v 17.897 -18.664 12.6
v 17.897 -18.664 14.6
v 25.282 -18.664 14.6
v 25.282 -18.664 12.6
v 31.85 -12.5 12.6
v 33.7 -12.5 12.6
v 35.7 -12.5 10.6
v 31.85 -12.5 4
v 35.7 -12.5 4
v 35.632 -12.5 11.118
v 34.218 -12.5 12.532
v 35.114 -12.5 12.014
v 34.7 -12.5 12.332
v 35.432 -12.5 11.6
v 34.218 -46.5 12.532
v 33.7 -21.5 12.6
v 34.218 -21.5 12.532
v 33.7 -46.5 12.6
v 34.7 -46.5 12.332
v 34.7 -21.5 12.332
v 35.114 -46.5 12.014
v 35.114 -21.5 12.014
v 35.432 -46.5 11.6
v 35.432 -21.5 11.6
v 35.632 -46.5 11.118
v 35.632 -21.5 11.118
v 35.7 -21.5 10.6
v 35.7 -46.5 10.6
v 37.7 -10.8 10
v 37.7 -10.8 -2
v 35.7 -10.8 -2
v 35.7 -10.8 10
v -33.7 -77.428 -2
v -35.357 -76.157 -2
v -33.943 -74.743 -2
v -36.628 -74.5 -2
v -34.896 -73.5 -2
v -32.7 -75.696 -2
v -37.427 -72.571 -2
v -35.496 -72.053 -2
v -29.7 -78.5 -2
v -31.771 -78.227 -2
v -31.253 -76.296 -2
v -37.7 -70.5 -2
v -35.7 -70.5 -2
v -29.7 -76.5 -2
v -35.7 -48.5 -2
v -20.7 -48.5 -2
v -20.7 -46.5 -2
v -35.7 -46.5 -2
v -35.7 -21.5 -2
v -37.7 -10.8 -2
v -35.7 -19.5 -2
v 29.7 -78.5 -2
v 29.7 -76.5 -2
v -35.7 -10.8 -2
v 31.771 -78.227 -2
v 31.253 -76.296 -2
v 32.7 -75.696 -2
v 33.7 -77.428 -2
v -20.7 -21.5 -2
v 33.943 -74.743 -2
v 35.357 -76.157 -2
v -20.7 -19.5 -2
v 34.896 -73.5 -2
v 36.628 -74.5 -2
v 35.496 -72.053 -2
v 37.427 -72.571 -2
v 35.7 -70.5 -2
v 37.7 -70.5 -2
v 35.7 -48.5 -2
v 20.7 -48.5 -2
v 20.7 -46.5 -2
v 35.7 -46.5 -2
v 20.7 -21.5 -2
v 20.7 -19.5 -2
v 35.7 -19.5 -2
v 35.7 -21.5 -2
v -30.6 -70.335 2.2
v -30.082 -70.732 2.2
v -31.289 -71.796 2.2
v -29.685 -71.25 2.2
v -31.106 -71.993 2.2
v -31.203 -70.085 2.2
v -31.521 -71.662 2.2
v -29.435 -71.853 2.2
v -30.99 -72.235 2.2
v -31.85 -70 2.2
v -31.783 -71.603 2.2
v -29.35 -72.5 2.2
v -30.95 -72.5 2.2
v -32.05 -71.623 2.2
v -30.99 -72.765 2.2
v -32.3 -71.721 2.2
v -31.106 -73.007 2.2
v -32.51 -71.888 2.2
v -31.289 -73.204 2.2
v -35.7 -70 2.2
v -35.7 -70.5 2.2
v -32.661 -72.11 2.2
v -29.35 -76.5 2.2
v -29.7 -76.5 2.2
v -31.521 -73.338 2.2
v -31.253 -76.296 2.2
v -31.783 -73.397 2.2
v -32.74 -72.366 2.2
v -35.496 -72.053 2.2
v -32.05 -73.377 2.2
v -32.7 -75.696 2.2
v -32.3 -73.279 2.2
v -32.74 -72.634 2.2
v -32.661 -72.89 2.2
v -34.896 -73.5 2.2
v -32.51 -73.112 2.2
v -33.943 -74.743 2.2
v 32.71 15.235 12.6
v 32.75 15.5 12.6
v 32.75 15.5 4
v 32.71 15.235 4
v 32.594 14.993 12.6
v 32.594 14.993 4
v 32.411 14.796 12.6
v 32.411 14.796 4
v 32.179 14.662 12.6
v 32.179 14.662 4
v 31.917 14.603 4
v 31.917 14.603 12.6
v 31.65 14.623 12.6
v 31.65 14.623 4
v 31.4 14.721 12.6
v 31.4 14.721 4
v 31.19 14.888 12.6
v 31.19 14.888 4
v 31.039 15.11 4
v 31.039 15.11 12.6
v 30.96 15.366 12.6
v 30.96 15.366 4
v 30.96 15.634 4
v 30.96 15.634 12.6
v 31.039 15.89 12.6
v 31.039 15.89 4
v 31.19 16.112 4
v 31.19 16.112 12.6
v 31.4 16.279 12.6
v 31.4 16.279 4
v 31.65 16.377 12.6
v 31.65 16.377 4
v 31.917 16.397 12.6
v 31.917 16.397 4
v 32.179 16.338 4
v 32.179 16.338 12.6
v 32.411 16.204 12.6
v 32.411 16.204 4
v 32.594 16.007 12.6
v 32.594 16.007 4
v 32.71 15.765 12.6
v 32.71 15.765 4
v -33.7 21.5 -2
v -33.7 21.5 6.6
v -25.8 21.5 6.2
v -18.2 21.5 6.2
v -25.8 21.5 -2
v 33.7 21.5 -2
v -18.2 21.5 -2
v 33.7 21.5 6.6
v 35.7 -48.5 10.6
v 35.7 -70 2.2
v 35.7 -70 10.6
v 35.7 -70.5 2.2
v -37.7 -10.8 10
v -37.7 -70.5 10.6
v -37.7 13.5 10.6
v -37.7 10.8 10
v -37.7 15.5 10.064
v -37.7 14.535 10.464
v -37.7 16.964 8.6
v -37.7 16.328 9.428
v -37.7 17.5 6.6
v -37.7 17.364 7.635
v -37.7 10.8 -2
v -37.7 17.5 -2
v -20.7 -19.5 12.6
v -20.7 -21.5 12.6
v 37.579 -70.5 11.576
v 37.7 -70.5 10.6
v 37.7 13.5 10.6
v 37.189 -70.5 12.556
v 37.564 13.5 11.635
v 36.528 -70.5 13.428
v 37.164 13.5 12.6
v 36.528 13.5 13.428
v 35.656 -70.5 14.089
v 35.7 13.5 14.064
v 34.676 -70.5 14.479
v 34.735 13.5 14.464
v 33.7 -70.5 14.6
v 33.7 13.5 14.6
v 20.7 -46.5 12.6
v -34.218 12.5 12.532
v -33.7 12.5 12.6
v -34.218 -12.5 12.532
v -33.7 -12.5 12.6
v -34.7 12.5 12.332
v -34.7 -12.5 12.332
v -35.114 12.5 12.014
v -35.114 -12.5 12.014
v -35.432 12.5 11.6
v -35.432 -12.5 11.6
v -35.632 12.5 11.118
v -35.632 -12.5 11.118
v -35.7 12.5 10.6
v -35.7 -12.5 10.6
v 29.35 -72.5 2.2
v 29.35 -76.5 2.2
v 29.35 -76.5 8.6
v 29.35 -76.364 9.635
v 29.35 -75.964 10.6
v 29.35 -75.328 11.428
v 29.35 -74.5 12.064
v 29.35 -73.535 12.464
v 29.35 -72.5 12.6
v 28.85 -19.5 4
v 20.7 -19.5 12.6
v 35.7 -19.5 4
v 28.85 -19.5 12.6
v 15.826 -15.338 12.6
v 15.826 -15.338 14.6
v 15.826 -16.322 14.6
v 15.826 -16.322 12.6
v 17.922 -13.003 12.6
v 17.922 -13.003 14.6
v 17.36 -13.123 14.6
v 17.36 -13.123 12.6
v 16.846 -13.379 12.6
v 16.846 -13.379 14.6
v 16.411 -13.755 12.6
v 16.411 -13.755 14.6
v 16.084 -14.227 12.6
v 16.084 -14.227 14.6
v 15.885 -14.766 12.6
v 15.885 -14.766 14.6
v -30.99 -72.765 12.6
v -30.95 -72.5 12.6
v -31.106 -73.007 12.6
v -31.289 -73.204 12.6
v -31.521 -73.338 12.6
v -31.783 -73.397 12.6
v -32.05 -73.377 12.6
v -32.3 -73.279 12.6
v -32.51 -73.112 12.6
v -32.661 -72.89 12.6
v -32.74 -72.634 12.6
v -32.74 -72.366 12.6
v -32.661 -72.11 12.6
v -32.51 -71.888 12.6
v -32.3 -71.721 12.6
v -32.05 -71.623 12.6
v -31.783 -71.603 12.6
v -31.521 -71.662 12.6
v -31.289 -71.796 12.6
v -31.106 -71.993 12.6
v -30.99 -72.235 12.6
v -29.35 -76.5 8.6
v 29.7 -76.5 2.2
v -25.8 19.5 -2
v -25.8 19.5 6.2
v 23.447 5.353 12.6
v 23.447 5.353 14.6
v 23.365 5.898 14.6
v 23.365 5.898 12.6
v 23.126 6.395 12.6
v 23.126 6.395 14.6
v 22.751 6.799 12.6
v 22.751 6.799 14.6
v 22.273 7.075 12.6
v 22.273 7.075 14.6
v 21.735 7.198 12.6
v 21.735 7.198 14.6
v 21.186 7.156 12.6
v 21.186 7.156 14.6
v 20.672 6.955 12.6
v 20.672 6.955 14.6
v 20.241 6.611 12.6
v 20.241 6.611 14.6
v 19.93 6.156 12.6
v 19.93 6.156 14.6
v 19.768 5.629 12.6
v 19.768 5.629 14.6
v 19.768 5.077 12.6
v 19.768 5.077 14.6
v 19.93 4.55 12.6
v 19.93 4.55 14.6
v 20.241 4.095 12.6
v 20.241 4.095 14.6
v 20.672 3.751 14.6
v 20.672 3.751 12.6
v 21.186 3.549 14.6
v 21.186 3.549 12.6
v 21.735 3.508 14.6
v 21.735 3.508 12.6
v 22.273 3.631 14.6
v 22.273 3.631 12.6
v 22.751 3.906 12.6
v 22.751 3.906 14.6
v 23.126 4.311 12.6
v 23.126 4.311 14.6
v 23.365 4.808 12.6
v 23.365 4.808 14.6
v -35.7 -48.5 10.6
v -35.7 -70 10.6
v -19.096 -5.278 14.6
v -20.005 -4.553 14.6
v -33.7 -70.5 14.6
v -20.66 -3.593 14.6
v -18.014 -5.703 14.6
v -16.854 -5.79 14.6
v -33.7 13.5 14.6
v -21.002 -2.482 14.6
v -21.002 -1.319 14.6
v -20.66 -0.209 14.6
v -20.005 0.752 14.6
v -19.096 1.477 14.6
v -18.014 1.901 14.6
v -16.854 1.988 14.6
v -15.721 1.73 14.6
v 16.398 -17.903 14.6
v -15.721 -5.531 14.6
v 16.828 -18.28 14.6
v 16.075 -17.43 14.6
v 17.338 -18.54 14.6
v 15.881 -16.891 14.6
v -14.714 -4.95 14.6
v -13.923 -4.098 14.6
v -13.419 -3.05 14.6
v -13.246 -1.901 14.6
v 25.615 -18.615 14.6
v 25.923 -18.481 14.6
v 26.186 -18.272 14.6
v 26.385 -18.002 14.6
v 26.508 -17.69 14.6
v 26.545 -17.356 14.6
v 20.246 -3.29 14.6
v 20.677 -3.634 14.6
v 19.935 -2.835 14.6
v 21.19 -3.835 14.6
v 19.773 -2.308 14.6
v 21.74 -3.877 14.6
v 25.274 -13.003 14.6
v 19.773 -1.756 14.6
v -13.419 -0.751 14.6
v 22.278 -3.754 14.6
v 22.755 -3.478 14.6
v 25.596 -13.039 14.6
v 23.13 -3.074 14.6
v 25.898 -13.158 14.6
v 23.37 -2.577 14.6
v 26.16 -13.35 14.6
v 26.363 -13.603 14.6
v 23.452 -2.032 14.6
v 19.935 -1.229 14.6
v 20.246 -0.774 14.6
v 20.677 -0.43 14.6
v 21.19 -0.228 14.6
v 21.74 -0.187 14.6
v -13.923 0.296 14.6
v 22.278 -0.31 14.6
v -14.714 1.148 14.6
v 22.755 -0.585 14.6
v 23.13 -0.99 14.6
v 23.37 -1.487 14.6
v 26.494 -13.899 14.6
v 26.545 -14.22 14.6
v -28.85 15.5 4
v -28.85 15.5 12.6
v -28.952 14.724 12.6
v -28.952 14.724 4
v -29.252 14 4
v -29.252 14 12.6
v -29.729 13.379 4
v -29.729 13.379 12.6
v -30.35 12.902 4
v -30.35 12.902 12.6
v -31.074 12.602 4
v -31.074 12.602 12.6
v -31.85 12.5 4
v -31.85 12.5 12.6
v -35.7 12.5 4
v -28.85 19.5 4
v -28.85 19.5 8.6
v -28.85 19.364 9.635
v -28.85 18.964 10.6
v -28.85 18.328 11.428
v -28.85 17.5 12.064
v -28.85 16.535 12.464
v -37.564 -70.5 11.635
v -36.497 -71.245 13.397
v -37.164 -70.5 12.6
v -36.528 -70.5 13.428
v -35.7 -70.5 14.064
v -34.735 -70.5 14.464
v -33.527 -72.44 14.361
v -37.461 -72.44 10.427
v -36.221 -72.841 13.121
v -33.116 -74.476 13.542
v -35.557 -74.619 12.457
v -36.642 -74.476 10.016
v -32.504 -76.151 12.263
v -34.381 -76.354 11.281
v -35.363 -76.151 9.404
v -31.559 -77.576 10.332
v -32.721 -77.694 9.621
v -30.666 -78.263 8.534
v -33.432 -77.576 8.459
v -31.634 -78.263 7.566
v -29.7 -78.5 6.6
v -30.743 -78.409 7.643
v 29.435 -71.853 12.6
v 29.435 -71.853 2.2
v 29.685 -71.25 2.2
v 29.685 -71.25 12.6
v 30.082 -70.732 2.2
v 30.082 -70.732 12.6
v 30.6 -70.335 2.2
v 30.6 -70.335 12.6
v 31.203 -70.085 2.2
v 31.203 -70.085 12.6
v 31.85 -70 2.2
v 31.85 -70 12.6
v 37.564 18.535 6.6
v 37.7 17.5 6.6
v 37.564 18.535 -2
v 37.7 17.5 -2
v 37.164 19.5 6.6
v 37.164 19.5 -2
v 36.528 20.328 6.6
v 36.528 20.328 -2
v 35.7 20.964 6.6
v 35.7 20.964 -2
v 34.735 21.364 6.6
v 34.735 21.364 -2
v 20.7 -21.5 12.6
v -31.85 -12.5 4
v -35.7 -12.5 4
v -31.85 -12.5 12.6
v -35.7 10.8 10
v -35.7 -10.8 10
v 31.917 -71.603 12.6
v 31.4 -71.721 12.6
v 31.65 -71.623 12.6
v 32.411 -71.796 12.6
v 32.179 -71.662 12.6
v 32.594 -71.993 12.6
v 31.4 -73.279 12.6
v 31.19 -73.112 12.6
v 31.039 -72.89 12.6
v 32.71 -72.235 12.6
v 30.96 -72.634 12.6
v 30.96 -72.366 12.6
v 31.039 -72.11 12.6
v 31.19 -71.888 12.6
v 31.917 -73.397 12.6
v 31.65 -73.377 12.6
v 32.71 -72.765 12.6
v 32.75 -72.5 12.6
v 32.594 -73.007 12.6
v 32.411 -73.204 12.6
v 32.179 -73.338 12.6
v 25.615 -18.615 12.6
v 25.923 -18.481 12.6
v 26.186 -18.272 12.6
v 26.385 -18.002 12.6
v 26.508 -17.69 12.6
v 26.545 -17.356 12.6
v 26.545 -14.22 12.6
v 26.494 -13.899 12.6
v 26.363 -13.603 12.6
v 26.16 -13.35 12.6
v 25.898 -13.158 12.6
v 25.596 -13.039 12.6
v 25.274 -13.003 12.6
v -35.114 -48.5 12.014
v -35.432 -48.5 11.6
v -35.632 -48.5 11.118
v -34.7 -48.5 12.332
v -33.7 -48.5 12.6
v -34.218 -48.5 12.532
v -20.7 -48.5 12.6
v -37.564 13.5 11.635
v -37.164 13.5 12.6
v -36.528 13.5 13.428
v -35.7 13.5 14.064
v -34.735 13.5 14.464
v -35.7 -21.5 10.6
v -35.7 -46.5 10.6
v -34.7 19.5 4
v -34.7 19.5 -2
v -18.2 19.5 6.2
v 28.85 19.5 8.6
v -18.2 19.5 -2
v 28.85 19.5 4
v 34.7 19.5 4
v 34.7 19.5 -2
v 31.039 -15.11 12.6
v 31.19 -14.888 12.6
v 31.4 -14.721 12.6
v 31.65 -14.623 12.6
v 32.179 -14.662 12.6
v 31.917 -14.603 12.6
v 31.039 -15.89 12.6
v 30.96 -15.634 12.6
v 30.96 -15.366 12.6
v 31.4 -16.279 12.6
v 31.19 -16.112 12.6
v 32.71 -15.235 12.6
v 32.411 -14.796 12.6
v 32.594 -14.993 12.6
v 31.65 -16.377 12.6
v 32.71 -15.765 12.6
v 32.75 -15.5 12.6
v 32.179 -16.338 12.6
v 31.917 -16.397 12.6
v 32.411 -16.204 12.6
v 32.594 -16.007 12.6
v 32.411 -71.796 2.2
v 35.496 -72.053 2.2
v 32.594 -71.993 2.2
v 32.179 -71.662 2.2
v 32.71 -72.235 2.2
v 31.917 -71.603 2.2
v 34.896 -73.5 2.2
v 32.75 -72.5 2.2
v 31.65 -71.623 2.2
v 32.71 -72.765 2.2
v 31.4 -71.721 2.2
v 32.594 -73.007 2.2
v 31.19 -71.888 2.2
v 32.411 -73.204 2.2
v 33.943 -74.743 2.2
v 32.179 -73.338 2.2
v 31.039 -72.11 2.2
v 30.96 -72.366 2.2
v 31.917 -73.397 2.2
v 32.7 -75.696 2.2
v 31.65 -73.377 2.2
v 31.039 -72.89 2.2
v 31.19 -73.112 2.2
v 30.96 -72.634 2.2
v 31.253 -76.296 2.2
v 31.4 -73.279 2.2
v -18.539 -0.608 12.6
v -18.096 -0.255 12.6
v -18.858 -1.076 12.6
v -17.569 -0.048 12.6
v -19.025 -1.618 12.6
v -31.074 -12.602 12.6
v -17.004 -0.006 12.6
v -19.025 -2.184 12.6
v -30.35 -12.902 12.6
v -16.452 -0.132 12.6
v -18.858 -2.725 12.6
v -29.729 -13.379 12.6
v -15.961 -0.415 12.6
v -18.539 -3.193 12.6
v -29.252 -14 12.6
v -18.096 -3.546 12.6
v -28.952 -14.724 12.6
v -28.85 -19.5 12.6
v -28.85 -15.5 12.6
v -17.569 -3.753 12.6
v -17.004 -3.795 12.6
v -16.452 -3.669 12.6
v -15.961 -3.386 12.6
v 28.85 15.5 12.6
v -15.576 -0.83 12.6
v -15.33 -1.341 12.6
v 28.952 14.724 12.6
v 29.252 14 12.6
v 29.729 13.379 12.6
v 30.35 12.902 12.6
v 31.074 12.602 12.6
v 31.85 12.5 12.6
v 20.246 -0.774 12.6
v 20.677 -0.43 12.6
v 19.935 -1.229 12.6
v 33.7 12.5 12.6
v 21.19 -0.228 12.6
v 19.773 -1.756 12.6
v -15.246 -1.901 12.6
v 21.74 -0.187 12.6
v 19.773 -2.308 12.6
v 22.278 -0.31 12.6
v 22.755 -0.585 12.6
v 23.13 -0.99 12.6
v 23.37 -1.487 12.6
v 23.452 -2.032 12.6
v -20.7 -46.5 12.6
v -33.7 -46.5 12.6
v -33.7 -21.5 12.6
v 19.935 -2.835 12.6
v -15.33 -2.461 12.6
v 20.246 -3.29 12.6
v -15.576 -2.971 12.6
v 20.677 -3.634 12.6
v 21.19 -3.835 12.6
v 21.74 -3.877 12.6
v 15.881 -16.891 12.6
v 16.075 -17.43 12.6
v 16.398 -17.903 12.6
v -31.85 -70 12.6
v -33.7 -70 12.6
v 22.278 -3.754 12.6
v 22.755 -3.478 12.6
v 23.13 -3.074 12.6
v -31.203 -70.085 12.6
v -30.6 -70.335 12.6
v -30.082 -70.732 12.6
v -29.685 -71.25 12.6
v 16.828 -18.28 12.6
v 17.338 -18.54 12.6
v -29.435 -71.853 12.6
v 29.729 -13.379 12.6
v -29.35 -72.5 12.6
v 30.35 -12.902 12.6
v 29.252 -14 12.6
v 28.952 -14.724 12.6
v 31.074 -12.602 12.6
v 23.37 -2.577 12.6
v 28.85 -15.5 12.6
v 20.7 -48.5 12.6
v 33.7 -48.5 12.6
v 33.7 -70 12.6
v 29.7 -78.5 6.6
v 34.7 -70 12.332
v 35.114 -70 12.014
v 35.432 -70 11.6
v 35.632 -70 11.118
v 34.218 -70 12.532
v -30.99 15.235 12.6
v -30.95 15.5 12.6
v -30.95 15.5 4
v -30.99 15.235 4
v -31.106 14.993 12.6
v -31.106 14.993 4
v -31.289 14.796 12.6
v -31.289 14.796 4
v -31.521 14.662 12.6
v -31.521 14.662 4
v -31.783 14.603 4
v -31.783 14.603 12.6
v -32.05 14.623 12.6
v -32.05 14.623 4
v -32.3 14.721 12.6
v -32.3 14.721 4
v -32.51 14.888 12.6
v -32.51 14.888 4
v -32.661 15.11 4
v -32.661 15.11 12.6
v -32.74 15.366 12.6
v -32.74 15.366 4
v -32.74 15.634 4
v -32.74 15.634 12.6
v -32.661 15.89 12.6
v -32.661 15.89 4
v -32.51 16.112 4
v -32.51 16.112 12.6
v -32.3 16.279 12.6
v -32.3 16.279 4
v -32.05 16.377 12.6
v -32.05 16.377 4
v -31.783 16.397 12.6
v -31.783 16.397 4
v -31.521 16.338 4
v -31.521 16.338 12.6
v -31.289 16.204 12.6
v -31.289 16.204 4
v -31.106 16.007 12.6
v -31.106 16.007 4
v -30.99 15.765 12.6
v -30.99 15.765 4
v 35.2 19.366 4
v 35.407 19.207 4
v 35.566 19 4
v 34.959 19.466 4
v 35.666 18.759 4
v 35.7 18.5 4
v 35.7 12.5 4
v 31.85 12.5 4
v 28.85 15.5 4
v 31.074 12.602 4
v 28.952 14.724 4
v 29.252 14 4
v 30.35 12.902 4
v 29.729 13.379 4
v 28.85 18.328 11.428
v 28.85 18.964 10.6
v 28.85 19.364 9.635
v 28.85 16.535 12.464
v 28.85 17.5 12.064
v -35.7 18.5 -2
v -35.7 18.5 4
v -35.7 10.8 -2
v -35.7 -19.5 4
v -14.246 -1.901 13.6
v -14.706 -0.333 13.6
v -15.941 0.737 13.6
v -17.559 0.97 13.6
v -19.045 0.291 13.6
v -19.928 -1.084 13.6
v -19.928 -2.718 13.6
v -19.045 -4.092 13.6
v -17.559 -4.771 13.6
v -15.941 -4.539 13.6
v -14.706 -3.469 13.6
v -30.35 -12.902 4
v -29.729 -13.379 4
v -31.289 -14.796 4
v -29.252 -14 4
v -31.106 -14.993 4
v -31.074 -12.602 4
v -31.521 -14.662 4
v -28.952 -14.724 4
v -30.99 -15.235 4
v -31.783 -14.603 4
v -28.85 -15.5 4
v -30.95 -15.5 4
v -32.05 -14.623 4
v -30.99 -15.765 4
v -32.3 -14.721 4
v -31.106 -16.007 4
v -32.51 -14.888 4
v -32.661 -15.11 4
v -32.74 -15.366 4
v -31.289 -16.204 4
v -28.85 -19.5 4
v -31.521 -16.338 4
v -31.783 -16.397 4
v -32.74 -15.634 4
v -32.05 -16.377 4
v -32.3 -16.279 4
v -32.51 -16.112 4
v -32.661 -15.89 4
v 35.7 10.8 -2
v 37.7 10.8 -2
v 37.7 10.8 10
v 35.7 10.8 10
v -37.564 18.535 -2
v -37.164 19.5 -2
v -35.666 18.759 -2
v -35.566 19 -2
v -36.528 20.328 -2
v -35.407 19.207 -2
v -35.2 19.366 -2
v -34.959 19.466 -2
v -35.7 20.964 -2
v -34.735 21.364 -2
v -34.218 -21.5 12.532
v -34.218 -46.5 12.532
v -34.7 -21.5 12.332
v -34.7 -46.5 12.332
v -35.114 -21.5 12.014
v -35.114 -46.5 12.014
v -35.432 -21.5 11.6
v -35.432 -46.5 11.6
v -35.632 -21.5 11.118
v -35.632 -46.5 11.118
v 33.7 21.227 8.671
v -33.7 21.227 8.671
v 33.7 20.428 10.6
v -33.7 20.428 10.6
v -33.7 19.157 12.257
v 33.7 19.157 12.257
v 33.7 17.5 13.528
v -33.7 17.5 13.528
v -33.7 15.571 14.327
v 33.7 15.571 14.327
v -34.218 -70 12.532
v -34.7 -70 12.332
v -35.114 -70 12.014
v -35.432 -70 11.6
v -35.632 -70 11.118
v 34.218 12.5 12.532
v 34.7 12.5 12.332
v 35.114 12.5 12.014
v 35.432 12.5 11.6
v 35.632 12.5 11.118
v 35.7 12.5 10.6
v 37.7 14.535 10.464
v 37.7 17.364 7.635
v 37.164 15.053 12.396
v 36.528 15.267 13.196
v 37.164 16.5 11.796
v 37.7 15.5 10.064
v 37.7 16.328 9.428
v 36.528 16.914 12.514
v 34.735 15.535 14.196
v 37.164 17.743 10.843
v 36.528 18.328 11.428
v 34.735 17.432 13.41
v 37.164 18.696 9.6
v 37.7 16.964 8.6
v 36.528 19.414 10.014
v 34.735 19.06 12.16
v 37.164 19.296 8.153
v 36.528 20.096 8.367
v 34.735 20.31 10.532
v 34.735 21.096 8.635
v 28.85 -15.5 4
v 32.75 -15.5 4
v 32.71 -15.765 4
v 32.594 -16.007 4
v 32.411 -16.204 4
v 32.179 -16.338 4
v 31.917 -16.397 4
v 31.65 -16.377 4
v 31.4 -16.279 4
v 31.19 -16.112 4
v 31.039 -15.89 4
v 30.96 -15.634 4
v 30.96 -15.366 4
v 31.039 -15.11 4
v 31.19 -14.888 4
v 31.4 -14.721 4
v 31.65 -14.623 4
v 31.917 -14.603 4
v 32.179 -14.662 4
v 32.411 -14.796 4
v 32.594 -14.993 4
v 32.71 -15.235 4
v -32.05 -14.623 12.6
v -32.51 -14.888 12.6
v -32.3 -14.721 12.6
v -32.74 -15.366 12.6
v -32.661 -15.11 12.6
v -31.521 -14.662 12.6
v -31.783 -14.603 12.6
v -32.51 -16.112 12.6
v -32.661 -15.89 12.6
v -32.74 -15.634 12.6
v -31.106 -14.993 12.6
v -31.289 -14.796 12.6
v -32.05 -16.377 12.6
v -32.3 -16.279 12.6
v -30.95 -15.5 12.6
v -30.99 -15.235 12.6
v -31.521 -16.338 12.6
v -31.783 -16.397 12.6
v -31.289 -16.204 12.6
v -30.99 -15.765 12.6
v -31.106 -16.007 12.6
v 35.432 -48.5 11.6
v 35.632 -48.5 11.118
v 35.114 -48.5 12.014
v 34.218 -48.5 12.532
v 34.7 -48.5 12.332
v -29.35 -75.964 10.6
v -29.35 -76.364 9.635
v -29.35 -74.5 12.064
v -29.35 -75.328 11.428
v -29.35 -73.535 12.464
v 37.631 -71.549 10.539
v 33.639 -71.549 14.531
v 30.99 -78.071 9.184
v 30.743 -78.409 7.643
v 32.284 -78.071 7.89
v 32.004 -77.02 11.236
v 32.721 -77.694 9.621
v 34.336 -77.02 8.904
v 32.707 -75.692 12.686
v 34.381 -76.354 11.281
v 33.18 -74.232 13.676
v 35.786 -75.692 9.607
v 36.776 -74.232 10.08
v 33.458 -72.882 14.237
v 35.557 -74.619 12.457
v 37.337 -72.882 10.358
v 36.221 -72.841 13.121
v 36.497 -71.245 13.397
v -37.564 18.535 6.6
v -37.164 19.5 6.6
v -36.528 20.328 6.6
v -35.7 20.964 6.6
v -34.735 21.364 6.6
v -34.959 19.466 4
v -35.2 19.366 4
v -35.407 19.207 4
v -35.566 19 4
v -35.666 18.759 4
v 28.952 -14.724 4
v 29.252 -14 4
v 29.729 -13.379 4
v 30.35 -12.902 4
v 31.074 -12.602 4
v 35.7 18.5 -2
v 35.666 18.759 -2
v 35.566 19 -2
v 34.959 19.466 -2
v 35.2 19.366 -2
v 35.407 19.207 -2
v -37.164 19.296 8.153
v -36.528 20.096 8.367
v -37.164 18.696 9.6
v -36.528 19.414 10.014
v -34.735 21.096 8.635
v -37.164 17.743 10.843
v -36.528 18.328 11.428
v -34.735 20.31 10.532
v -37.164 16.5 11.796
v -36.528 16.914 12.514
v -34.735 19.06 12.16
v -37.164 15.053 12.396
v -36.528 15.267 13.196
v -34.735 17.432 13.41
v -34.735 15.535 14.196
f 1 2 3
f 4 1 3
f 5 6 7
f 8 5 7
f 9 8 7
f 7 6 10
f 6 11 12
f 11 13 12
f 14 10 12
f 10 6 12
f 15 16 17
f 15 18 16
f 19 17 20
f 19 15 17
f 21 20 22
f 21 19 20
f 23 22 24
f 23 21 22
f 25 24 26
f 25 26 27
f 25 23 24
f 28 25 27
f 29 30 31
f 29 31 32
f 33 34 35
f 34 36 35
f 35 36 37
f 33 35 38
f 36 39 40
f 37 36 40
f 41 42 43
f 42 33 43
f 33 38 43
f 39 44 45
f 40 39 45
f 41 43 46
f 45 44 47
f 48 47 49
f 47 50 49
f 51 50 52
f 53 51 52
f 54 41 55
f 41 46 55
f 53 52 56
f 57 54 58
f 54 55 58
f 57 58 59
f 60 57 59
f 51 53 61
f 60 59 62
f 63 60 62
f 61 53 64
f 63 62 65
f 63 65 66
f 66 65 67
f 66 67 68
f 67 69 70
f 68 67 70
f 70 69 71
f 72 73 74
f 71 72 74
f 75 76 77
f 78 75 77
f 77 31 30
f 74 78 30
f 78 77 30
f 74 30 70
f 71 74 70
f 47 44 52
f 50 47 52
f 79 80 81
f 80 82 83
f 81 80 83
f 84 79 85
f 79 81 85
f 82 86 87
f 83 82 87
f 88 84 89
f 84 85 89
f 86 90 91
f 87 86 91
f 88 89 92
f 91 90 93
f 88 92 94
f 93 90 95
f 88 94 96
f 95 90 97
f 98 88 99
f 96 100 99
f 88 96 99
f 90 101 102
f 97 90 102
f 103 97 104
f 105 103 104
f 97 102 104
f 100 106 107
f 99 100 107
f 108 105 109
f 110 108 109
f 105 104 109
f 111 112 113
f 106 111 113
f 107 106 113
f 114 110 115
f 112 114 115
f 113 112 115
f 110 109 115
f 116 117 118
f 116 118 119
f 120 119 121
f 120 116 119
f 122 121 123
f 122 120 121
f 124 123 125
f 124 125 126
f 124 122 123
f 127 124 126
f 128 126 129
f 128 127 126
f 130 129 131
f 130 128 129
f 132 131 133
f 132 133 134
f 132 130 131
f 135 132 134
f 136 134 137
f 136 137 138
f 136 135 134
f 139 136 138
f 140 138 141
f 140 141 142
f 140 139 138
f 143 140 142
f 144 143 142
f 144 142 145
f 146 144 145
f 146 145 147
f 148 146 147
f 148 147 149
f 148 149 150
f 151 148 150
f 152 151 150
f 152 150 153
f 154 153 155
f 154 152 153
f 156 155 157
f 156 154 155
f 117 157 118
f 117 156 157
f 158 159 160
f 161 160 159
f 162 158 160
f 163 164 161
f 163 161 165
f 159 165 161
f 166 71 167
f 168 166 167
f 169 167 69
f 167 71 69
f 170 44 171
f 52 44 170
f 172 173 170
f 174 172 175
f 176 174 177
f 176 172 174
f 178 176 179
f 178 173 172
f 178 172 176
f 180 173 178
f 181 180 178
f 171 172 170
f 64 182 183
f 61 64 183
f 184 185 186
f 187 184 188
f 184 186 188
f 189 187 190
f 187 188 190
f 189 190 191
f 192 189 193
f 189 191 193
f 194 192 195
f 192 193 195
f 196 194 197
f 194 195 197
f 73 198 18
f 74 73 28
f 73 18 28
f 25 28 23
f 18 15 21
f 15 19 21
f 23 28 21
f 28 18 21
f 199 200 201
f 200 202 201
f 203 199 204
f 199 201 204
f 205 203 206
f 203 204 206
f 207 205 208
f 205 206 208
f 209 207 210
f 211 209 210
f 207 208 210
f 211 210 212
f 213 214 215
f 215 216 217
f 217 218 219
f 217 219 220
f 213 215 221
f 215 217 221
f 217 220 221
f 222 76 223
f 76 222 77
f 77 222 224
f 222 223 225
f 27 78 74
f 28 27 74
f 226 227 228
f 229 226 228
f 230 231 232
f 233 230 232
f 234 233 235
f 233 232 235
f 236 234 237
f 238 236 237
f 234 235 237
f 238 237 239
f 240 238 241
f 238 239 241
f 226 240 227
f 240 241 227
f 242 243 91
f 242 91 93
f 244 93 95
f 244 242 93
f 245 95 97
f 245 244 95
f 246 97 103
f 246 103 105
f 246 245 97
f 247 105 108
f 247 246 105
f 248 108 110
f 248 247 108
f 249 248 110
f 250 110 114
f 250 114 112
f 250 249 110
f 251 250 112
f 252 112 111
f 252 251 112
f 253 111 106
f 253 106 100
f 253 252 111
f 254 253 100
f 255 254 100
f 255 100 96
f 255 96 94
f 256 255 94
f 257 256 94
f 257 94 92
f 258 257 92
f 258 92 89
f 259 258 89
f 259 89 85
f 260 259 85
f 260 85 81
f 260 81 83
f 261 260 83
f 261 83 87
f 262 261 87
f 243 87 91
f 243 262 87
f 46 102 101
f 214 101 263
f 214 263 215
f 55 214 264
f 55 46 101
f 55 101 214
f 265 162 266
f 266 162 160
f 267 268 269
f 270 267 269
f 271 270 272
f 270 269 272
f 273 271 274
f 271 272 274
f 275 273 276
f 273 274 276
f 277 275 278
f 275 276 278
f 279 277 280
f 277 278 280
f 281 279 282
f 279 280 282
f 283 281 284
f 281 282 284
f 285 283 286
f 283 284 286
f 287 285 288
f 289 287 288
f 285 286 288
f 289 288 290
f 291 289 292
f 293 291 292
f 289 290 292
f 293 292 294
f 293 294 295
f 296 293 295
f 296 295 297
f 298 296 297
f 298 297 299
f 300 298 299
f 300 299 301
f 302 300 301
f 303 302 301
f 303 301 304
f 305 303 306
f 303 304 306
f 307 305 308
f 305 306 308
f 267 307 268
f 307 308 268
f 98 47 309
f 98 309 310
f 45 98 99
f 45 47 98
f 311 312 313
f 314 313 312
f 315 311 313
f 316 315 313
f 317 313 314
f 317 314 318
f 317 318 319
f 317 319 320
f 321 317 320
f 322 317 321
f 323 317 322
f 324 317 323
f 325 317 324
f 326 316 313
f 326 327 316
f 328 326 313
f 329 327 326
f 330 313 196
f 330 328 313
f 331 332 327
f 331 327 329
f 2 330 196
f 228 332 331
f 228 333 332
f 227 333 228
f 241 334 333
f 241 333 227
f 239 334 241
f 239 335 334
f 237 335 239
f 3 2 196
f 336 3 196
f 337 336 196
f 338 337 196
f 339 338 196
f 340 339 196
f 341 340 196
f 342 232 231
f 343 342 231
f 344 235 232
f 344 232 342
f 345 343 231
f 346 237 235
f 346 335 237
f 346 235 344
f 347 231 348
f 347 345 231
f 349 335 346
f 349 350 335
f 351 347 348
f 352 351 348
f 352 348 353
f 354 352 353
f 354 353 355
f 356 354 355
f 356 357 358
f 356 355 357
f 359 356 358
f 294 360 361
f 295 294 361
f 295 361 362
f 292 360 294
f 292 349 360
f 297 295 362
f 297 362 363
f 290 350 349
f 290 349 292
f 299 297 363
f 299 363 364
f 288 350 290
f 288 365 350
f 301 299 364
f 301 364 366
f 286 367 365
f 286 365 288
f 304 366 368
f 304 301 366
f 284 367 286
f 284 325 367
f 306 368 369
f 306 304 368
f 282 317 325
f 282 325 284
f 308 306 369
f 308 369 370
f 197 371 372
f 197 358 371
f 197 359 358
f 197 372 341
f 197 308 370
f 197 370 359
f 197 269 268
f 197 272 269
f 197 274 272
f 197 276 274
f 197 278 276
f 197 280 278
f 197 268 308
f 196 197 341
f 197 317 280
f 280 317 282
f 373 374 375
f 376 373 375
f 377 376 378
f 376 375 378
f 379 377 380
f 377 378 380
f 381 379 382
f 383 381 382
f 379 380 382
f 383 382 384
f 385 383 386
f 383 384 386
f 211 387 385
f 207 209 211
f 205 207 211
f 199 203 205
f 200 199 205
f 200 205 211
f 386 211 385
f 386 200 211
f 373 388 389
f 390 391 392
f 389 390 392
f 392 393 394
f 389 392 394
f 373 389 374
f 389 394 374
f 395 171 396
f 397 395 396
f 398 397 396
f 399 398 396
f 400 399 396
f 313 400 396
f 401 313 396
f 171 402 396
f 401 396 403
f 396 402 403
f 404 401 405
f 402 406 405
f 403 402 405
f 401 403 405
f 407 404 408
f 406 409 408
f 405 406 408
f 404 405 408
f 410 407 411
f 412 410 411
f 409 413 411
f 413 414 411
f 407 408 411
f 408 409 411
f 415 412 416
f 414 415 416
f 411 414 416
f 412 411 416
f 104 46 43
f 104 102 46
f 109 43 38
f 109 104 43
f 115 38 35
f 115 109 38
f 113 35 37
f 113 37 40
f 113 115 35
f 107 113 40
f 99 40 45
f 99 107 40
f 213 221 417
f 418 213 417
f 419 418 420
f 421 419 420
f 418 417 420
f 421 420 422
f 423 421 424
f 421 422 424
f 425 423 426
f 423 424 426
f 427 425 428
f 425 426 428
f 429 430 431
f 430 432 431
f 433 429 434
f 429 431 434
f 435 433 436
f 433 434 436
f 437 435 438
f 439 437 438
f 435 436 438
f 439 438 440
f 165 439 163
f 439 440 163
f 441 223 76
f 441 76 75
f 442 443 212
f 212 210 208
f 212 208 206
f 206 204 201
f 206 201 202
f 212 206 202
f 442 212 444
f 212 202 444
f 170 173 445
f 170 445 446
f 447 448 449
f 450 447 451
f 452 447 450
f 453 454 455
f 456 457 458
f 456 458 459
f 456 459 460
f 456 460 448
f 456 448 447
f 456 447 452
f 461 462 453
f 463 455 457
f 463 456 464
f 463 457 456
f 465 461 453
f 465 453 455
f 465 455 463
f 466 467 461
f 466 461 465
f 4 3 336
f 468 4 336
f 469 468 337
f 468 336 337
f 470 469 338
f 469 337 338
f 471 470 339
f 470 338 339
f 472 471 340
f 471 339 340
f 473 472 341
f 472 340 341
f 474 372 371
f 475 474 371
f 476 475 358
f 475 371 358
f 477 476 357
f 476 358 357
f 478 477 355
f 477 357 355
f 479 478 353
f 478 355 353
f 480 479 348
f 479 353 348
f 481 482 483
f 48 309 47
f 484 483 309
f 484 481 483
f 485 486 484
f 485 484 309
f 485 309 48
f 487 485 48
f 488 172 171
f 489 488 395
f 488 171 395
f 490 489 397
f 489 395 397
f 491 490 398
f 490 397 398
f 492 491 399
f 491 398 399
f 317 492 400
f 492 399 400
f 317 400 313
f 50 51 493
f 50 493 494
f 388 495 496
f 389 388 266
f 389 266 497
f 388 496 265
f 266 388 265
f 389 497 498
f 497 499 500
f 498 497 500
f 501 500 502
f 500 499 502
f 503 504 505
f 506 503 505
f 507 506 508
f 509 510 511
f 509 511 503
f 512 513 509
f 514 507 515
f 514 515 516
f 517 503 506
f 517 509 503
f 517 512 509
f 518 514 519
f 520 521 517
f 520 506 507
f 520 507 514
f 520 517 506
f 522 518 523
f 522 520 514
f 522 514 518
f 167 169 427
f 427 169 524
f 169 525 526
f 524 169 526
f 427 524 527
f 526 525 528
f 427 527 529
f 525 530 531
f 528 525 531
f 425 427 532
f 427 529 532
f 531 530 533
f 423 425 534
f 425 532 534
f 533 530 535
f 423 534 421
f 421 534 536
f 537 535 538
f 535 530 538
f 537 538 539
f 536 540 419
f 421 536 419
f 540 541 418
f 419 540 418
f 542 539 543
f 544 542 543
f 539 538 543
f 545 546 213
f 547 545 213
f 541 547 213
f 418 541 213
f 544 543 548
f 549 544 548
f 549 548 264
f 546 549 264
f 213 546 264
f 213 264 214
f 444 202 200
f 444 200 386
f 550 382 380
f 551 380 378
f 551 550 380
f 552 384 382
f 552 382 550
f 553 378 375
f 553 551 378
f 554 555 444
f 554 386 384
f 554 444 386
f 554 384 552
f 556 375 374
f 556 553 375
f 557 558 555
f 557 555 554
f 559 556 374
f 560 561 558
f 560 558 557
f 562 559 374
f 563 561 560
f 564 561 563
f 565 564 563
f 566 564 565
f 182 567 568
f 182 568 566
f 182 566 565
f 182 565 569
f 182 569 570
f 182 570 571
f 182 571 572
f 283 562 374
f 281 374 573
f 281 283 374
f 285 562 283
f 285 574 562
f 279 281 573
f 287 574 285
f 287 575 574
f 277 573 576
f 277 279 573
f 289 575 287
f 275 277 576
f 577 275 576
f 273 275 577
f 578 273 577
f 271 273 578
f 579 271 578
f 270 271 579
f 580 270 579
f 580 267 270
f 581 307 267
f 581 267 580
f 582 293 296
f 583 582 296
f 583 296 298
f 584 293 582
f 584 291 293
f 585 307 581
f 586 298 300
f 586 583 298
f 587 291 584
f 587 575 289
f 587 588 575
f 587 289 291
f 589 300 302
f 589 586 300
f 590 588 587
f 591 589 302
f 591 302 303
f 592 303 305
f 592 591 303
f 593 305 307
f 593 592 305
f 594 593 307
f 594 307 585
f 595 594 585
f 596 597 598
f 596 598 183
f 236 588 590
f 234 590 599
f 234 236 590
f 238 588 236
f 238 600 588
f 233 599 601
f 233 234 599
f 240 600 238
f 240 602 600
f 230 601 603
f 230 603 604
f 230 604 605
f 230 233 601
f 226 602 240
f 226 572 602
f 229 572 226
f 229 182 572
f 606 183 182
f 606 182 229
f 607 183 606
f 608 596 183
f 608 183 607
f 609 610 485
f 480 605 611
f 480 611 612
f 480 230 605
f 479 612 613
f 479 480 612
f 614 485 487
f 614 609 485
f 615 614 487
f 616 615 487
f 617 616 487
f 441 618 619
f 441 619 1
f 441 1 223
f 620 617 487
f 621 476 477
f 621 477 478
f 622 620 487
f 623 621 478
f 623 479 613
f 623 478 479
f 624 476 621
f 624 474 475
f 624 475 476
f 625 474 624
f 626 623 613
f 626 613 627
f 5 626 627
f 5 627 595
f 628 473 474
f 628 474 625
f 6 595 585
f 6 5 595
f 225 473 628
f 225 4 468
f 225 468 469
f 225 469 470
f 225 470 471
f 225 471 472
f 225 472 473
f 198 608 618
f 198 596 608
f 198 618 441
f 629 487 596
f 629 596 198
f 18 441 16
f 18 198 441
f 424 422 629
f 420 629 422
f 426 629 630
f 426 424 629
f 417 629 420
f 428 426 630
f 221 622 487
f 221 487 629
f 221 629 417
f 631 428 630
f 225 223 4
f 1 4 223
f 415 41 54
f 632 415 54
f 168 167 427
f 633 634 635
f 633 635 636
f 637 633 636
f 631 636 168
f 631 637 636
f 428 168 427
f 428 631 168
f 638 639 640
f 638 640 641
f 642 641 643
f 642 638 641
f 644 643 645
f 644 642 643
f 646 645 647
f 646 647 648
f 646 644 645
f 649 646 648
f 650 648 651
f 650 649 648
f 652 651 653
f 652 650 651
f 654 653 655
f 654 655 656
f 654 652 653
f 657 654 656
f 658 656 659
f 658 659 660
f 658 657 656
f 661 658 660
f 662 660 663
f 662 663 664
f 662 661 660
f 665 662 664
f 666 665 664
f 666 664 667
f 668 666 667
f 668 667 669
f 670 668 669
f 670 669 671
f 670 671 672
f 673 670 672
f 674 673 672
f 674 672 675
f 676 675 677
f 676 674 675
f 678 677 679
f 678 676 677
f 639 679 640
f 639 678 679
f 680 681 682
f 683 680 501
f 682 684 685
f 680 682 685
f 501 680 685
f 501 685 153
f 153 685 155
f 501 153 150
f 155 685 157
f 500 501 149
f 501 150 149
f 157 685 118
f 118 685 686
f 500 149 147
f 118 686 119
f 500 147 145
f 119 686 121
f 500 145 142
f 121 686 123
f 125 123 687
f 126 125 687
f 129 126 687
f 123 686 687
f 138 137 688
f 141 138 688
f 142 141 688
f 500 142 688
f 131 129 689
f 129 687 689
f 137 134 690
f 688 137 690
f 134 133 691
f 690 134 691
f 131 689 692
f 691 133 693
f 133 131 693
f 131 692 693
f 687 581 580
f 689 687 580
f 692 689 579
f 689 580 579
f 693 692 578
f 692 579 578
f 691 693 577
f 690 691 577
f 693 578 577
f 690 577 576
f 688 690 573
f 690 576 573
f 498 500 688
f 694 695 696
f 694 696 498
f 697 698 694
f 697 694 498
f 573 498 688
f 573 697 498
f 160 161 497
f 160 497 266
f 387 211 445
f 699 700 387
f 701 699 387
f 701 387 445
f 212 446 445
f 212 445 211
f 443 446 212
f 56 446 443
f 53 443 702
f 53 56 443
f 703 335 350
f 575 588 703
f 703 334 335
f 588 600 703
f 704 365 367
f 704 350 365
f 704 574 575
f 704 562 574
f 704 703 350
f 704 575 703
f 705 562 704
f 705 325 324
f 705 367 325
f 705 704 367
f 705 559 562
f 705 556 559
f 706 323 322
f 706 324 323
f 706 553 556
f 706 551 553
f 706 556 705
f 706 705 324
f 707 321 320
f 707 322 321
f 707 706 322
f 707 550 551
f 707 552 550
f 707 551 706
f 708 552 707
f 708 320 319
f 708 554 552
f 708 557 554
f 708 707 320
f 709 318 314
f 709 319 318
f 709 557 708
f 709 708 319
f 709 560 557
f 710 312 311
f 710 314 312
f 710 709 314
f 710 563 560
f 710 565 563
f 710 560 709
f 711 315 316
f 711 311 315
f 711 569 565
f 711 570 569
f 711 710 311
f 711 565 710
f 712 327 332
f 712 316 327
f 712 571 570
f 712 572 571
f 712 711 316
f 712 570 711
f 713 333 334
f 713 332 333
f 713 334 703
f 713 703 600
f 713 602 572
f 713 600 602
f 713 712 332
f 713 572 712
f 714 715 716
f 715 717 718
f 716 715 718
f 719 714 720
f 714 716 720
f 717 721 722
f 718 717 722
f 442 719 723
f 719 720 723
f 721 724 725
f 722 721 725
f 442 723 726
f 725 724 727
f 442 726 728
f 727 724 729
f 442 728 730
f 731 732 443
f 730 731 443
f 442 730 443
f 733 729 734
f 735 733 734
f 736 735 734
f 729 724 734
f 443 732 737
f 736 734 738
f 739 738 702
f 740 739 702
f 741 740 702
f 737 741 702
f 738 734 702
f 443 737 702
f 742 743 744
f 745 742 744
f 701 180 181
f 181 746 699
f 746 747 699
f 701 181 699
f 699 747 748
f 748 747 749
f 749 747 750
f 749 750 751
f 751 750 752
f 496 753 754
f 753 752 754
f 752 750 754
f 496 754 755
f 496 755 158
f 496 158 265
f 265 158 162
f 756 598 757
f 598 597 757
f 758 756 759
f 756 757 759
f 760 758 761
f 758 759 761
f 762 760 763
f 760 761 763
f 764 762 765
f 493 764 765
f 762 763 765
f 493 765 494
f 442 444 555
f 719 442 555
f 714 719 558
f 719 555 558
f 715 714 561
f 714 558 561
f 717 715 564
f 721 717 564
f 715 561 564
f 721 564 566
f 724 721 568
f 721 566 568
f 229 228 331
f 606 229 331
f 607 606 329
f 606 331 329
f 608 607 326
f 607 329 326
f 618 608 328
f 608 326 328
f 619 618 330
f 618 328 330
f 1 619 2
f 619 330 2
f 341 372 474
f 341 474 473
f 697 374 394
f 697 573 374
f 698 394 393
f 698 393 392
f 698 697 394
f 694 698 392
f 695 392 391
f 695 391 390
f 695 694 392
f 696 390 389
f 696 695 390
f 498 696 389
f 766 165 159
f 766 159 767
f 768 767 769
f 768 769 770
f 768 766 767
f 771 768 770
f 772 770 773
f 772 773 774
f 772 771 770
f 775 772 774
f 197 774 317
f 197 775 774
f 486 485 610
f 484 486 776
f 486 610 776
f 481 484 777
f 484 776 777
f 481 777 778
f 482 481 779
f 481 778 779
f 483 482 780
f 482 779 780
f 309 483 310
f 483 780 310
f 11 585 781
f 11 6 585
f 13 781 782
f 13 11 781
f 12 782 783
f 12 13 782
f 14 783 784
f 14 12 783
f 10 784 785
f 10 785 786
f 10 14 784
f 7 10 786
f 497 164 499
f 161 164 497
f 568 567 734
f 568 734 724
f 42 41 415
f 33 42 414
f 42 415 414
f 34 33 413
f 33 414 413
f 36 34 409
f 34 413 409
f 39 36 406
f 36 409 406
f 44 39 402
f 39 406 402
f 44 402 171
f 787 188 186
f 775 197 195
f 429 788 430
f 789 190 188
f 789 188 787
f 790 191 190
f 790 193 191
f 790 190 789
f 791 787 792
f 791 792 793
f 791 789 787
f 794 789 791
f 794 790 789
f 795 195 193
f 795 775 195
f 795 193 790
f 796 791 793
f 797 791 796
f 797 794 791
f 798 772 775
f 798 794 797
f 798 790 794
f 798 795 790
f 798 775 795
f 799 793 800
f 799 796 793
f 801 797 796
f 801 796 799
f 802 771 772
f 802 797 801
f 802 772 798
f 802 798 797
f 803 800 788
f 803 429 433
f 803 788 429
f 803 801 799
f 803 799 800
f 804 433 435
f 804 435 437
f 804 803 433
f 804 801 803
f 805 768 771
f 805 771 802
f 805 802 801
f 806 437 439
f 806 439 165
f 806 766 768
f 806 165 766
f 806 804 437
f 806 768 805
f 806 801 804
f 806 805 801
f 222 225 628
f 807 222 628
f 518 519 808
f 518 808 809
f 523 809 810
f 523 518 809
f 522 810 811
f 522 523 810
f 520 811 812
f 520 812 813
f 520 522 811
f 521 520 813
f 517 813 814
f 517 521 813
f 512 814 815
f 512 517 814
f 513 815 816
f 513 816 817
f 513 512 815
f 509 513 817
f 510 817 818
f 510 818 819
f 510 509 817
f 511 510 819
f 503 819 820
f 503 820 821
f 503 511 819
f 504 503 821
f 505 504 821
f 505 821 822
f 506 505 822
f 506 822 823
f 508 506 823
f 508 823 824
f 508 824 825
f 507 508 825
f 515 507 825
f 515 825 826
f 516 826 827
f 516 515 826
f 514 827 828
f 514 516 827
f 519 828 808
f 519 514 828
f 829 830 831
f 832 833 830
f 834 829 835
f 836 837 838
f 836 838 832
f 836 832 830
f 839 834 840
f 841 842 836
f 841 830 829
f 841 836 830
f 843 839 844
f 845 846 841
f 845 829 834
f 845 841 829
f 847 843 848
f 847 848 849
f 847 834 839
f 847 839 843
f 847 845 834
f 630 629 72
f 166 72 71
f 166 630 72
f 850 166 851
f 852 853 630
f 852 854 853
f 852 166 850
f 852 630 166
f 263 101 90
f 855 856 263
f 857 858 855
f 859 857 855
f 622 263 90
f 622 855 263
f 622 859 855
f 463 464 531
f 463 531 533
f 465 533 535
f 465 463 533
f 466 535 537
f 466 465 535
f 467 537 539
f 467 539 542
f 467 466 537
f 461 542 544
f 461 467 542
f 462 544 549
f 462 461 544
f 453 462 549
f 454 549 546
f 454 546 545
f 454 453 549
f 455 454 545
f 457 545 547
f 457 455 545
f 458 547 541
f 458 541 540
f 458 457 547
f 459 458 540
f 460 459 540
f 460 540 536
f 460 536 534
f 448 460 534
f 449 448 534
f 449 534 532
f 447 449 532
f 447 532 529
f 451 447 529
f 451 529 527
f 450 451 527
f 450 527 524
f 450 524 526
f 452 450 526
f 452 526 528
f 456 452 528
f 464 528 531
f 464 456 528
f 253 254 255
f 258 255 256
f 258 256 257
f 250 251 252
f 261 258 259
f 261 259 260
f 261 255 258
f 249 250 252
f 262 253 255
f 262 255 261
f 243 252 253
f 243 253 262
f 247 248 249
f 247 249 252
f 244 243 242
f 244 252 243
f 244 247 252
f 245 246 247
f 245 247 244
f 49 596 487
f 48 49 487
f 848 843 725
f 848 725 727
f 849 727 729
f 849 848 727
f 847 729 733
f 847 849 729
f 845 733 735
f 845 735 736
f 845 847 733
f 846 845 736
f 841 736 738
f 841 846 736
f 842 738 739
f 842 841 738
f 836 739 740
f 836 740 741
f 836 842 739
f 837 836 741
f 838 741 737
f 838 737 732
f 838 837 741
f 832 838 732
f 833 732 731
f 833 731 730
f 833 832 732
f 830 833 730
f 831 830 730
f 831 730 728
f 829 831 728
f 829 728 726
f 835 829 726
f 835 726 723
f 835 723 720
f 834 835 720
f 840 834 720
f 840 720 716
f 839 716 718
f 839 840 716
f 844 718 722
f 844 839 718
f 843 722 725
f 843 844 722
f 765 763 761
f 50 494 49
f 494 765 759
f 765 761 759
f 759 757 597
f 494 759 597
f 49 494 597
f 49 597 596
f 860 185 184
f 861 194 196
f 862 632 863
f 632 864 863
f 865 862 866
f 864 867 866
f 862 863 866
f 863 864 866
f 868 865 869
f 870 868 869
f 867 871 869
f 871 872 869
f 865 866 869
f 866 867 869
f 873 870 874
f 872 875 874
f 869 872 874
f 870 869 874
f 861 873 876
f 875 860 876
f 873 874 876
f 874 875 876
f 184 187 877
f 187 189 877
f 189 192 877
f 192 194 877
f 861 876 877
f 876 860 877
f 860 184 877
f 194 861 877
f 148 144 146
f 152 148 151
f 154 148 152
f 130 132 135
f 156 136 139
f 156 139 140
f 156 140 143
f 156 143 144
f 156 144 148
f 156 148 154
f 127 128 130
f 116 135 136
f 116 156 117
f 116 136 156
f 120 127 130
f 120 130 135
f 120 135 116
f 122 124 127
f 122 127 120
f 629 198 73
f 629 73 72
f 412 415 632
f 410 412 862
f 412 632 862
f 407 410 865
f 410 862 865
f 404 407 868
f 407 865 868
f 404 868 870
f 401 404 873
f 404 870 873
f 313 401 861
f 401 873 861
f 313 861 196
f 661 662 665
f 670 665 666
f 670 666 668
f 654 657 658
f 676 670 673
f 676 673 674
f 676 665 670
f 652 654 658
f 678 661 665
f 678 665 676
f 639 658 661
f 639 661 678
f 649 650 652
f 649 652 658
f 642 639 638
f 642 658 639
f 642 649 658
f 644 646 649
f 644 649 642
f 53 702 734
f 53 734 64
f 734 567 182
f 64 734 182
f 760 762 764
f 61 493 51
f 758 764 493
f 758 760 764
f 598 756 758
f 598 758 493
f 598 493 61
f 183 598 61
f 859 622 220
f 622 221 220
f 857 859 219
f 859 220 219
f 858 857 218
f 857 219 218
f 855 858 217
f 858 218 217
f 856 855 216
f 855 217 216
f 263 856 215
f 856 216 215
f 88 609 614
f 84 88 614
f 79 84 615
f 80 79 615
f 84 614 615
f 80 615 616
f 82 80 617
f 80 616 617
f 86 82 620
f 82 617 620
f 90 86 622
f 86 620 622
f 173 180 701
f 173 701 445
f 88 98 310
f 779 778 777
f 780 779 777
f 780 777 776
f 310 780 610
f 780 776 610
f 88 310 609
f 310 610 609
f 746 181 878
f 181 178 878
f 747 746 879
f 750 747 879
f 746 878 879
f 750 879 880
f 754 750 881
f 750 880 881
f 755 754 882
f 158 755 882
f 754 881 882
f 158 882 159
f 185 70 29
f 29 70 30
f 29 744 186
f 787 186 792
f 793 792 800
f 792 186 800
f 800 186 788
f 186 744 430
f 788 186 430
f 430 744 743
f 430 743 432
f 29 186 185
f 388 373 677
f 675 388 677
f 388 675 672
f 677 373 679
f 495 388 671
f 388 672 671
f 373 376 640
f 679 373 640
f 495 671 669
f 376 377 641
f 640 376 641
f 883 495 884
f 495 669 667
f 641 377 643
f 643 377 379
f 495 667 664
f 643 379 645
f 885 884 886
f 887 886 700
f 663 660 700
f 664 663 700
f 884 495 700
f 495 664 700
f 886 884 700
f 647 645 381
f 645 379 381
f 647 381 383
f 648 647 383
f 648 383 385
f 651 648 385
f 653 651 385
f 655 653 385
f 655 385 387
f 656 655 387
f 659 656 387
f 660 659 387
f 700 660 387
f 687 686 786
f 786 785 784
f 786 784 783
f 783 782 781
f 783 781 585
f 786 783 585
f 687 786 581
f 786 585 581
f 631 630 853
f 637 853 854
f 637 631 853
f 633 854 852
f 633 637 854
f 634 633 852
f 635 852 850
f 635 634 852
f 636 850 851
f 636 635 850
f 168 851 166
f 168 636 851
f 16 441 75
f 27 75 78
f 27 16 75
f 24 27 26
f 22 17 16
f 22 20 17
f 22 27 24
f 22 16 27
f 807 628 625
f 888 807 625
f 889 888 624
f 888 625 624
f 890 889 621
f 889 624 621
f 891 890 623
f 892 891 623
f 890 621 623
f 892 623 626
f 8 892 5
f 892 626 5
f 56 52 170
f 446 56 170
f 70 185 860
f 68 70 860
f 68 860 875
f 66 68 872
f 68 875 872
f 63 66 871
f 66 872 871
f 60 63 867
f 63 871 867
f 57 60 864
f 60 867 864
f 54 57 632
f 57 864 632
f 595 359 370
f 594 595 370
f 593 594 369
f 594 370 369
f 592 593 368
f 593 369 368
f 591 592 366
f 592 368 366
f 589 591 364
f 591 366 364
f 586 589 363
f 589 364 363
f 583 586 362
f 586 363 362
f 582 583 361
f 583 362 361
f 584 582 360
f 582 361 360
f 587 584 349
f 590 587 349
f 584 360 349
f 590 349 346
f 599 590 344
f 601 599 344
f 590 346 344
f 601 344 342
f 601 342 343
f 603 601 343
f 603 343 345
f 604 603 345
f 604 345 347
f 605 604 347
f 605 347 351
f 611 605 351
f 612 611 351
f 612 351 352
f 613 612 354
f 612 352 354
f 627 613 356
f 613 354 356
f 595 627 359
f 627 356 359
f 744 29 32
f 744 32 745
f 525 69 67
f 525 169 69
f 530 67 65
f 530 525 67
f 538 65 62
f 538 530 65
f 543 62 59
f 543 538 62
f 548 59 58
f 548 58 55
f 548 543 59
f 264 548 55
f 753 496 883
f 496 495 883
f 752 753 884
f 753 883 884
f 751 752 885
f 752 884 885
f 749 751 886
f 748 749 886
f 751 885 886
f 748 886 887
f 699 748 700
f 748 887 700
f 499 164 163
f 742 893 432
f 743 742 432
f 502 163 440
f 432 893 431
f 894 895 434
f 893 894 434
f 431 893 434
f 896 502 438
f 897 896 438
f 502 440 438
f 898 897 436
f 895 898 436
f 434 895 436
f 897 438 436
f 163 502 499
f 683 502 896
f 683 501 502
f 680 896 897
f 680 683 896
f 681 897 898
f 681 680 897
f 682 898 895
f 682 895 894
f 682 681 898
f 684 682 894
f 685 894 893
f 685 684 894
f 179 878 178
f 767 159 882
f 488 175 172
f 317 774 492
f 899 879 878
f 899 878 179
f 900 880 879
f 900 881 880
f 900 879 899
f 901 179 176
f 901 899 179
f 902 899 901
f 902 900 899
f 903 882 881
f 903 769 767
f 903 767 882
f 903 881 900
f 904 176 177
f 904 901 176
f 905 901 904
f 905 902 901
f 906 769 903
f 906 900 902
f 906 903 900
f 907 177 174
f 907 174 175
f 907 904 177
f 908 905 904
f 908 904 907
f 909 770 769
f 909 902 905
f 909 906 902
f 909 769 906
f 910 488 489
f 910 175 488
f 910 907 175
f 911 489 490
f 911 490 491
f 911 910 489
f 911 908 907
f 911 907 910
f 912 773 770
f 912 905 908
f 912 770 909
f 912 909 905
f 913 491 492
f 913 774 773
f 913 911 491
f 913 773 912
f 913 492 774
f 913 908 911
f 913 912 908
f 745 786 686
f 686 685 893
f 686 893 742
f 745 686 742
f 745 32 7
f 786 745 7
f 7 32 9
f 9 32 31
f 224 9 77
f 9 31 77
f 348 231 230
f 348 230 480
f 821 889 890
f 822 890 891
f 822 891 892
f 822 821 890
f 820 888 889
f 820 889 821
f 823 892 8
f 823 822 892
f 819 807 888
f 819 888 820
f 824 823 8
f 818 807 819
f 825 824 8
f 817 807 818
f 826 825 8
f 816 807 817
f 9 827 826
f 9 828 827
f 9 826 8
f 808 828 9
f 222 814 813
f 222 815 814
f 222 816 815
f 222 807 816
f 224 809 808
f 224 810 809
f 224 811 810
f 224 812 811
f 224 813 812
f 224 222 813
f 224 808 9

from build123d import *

# Parameters (mm, degrees)
SKETCH_W        = 75.4
SKETCH_H        = 100
PAD_DEPTH       = 16.6
SKETCH005_W     = 71.4
SKETCH005_H     = 96
POCKET_DEPTH    = 14.6
SKETCH006_W     = 21.6
SKETCH006_H     = 12
POCKET001_DEPTH = 2
SKETCH007_W     = 21.6
SKETCH007_H     = 12
POCKET002_DEPTH = 2
SKETCH008_W     = 7.6
SKETCH008_H     = 8.2
POCKET003_DEPTH = 2
SKETCH009_R     = 1.85
POCKET004_DEPTH = 2
SKETCH010_R     = 3.9
POCKET005_DEPTH = 2
POCKET005_TAPER = 45
SKETCH011_W     = 15
SKETCH011_H     = 2
PAD005_DEPTH    = 14.6
SKETCH012_R     = 0.9
PAD006_DEPTH    = 8.6
SKETCH013_R     = 0.9
PAD007_DEPTH    = 10.4
FILLET_R        = 2
FILLET001_R     = 4
FILLET002_R     = 1
FILLET003_R     = 6
FILLET004_R     = 8
FILLET005_R     = 4


with BuildPart() as part:
    # Sketch → Pad (new body)
    with BuildSketch(Plane.XY):
        with Locations((0, -28.5)):
            Rectangle(SKETCH_W, SKETCH_H)
    extrude(amount=PAD_DEPTH)

    # Sketch005 (on Face5 of Pad) → Pocket (cut)
    with BuildSketch(Plane(origin=(0, 0, 0), x_dir=(1, 0, 0), z_dir=(0, 0, -1))):
        with Locations((0, 28.5)):
            Rectangle(SKETCH005_W, SKETCH005_H)
    extrude(amount=-POCKET_DEPTH, mode=Mode.SUBTRACT)

    # Sketch006 (on Face3 of Pocket) → Pocket001 (cut)
    with BuildSketch(Plane.YZ.offset(37.7)):
        with Locations((0, 6)):
            Rectangle(SKETCH006_W, SKETCH006_H)
    extrude(amount=-POCKET001_DEPTH, mode=Mode.SUBTRACT)

    # Sketch007 (on Face2 of Pocket) → Pocket002 (cut)
    with BuildSketch(Plane(origin=(-37.7, 0, 0), x_dir=(0, -1, 0), z_dir=(-1, 0, 0))):
        with Locations((0, 6)):
            Rectangle(SKETCH007_W, SKETCH007_H)
    extrude(amount=-POCKET002_DEPTH, mode=Mode.SUBTRACT)

    # Sketch008 (on Face1 of Pocket) → Pocket003 (cut)
    with BuildSketch(Plane(origin=(0, 21.5, 0), x_dir=(-1, 0, 0), z_dir=(0, 1, 0))):
        with Locations((22, 4.1)):
            Rectangle(SKETCH008_W, SKETCH008_H)
    extrude(amount=-POCKET003_DEPTH, mode=Mode.SUBTRACT)

    # Sketch009 (on Face5 of Pocket) → Pocket004 (cut)
    with BuildSketch(Plane.XY.offset(16.6)):
        with Locations((21.601854, -2.031842)):
            Circle(SKETCH009_R)
        with Locations((21.597205, 5.352823)):
            Circle(SKETCH009_R)
        with BuildLine():
            Line((15.825713, -15.337742), (15.825713, -16.321696))
            ThreePointArc((15.825713, -16.321696), (16.397859, -17.902616), (17.897046, -18.663599))
            Line((17.897046, -18.663599), (25.282393, -18.663599))
            ThreePointArc((25.282393, -18.663599), (26.185781, -18.272491), (26.544973, -17.355945))
            Line((26.544973, -14.219638), (26.544973, -17.355945))
            ThreePointArc((26.544973, -14.219638), (26.159832, -13.349897), (25.274241, -13.00275))
            Line((17.921865, -13.00275), (25.274241, -13.00275))
            ThreePointArc((17.921865, -13.00275), (16.411472, -13.755218), (15.825713, -15.337742))
        make_face()
    extrude(amount=-POCKET004_DEPTH, mode=Mode.SUBTRACT)

    # Sketch010 (on Face5 of Pocket) → Pocket005 (cut)
    with BuildSketch(Plane.XY.offset(16.6)):
        with Locations((-17.145816, -1.900756)):
            Circle(SKETCH010_R)
    extrude(amount=-POCKET005_DEPTH, taper=POCKET005_TAPER, mode=Mode.SUBTRACT)

    # Sketch011 (on Face11 of Pocket) → Pad005 (join)
    with BuildSketch(Plane(origin=(0, 0, 14.6), x_dir=(1, 0, 0), z_dir=(0, 0, -1))):
        with Locations((-28.2, 47.5)):
            Rectangle(SKETCH011_W, SKETCH011_H)
        with Locations((-28.2, 20.5)):
            Rectangle(SKETCH011_W, SKETCH011_H)
        with Locations((28.2, 47.5)):
            Rectangle(SKETCH011_W, SKETCH011_H)
        with Locations((28.2, 20.5)):
            Rectangle(SKETCH011_W, SKETCH011_H)
    extrude(amount=PAD005_DEPTH)

    # Sketch012 (on Face11 of Pocket) → Pad006 (join)
    with BuildSketch(Plane(origin=(0, 0, 14.6), x_dir=(1, 0, 0), z_dir=(0, 0, -1))):
        with BuildLine():
            Line((-35.7, -12.5), (-31.85, -12.5))
            ThreePointArc((-28.85, -15.5), (-29.72868, -13.37868), (-31.85, -12.5))
            Line((-28.85, -19.5), (-28.85, -15.5))
            Line((-28.85, -19.5), (-35.7, -19.5))
            Line((-35.7, -12.5), (-35.7, -19.5))
        make_face()
        with Locations((-31.85, -15.5)):
            Circle(SKETCH012_R, mode=Mode.SUBTRACT)
        with BuildLine():
            Line((28.85, -19.5), (28.85, -15.5))
            ThreePointArc((31.85, -12.5), (29.72868, -13.37868), (28.85, -15.5))
            Line((35.7, -12.5), (31.85, -12.5))
            Line((35.7, -12.5), (35.7, -19.5))
            Line((28.85, -19.5), (35.7, -19.5))
        make_face()
        with Locations((31.85, -15.5)):
            Circle(SKETCH012_R, mode=Mode.SUBTRACT)
        with BuildLine():
            Line((-35.7, 12.5), (-35.7, 19.5))
            Line((-35.7, 19.5), (-28.85, 19.5))
            Line((-28.85, 19.5), (-28.85, 15.5))
            ThreePointArc((-31.85, 12.5), (-29.72868, 13.37868), (-28.85, 15.5))
            Line((-35.7, 12.5), (-31.85, 12.5))
        make_face()
        with Locations((-31.85, 15.5)):
            Circle(SKETCH012_R, mode=Mode.SUBTRACT)
        with BuildLine():
            Line((31.85, 12.5), (35.7, 12.5))
            Line((35.7, 12.5), (35.7, 19.5))
            Line((35.7, 19.5), (28.85, 19.5))
            Line((28.85, 19.5), (28.85, 15.5))
            ThreePointArc((28.85, 15.5), (29.72868, 13.37868), (31.85, 12.5))
        make_face()
        with Locations((31.85, 15.5)):
            Circle(SKETCH012_R, mode=Mode.SUBTRACT)
    extrude(amount=PAD006_DEPTH)

    # Sketch013 (on Face11 of Pocket) → Pad007 (join)
    with BuildSketch(Plane(origin=(0, 0, 14.6), x_dir=(1, 0, 0), z_dir=(0, 0, -1))):
        with BuildLine():
            Line((-35.7, 76.5), (-29.35, 76.5))
            Line((-29.35, 76.5), (-29.35, 72.5))
            ThreePointArc((-31.85, 70), (-30.082233, 70.732233), (-29.35, 72.5))
            Line((-35.7, 70), (-31.85, 70))
            Line((-35.7, 76.5), (-35.7, 70))
        make_face()
        with Locations((-31.85, 72.5)):
            Circle(SKETCH013_R, mode=Mode.SUBTRACT)
        with BuildLine():
            Line((35.7, 76.5), (35.7, 70))
            Line((35.7, 70), (31.85, 70))
            ThreePointArc((29.35, 72.5), (30.082233, 70.732233), (31.85, 70))
            Line((29.35, 76.5), (29.35, 72.5))
            Line((35.7, 76.5), (29.35, 76.5))
        make_face()
        with Locations((31.85, 72.5)):
            Circle(SKETCH013_R, mode=Mode.SUBTRACT)
    extrude(amount=PAD007_DEPTH)

    # Fillet
    fillet_edges = [part.edges().sort_by_distance(p)[0] for p in [
        (-35.7, 0, 14.6),
        (-35.7, -34, 14.6),
        (-35.7, -59.25, 14.6),
        (35.7, -59.25, 14.6),
        (35.7, -34, 14.6),
        (35.7, 0, 14.6),
    ]]
    fillet(fillet_edges, radius=FILLET_R)

    # Fillet001
    fillet001_edges = [part.edges().sort_by_distance(p)[0] for p in [
        (0, 19.5, 14.6),
        (0, -76.5, 14.6),
    ]]
    fillet(fillet001_edges, radius=FILLET001_R)

    # Fillet002
    fillet002_edges = [part.edges().sort_by_distance(p)[0] for p in [
        (-35.7, 19.5, 3),
        (35.7, 19.5, 3),
    ]]
    fillet(fillet002_edges, radius=FILLET002_R)

    # Fillet003
    fillet003_edges = [part.edges().sort_by_distance(p)[0] for p in [
        (-35.7, -76.5, 2.1),
        (35.7, -76.5, 2.1),
    ]]
    fillet(fillet003_edges, radius=FILLET003_R)

    # Fillet004
    fillet004_edges = [part.edges().sort_by_distance(p)[0] for p in [
        (37.7, -78.5, 8.3),
        (0, -78.5, 16.6),
        (-37.7, -78.5, 8.3),
        (0, 21.5, 16.6),
    ]]
    fillet(fillet004_edges, radius=FILLET004_R)

    # Fillet005
    fillet005_edges = [part.edges().sort_by_distance(p)[0] for p in [
        (37.7, -28.5, 16.6),
        (37.7, 21.5, 4.3),
        (37.7, 19.156854, 14.256854),
        (-37.7, 21.5, 4.3),
        (-37.7, 19.156854, 14.256854),
        (-37.7, -28.5, 16.6),
        (-34.868391, -76.606368, 13.768391),
        (34.868391, -76.606368, 13.768391),
    ]]
    fillet(fillet005_edges, radius=FILLET005_R)


with BuildPart() as part_1:
    # Body placement: moved
    add(part.part.moved(Location((0, 0, -2))))


solid = part_1.part
